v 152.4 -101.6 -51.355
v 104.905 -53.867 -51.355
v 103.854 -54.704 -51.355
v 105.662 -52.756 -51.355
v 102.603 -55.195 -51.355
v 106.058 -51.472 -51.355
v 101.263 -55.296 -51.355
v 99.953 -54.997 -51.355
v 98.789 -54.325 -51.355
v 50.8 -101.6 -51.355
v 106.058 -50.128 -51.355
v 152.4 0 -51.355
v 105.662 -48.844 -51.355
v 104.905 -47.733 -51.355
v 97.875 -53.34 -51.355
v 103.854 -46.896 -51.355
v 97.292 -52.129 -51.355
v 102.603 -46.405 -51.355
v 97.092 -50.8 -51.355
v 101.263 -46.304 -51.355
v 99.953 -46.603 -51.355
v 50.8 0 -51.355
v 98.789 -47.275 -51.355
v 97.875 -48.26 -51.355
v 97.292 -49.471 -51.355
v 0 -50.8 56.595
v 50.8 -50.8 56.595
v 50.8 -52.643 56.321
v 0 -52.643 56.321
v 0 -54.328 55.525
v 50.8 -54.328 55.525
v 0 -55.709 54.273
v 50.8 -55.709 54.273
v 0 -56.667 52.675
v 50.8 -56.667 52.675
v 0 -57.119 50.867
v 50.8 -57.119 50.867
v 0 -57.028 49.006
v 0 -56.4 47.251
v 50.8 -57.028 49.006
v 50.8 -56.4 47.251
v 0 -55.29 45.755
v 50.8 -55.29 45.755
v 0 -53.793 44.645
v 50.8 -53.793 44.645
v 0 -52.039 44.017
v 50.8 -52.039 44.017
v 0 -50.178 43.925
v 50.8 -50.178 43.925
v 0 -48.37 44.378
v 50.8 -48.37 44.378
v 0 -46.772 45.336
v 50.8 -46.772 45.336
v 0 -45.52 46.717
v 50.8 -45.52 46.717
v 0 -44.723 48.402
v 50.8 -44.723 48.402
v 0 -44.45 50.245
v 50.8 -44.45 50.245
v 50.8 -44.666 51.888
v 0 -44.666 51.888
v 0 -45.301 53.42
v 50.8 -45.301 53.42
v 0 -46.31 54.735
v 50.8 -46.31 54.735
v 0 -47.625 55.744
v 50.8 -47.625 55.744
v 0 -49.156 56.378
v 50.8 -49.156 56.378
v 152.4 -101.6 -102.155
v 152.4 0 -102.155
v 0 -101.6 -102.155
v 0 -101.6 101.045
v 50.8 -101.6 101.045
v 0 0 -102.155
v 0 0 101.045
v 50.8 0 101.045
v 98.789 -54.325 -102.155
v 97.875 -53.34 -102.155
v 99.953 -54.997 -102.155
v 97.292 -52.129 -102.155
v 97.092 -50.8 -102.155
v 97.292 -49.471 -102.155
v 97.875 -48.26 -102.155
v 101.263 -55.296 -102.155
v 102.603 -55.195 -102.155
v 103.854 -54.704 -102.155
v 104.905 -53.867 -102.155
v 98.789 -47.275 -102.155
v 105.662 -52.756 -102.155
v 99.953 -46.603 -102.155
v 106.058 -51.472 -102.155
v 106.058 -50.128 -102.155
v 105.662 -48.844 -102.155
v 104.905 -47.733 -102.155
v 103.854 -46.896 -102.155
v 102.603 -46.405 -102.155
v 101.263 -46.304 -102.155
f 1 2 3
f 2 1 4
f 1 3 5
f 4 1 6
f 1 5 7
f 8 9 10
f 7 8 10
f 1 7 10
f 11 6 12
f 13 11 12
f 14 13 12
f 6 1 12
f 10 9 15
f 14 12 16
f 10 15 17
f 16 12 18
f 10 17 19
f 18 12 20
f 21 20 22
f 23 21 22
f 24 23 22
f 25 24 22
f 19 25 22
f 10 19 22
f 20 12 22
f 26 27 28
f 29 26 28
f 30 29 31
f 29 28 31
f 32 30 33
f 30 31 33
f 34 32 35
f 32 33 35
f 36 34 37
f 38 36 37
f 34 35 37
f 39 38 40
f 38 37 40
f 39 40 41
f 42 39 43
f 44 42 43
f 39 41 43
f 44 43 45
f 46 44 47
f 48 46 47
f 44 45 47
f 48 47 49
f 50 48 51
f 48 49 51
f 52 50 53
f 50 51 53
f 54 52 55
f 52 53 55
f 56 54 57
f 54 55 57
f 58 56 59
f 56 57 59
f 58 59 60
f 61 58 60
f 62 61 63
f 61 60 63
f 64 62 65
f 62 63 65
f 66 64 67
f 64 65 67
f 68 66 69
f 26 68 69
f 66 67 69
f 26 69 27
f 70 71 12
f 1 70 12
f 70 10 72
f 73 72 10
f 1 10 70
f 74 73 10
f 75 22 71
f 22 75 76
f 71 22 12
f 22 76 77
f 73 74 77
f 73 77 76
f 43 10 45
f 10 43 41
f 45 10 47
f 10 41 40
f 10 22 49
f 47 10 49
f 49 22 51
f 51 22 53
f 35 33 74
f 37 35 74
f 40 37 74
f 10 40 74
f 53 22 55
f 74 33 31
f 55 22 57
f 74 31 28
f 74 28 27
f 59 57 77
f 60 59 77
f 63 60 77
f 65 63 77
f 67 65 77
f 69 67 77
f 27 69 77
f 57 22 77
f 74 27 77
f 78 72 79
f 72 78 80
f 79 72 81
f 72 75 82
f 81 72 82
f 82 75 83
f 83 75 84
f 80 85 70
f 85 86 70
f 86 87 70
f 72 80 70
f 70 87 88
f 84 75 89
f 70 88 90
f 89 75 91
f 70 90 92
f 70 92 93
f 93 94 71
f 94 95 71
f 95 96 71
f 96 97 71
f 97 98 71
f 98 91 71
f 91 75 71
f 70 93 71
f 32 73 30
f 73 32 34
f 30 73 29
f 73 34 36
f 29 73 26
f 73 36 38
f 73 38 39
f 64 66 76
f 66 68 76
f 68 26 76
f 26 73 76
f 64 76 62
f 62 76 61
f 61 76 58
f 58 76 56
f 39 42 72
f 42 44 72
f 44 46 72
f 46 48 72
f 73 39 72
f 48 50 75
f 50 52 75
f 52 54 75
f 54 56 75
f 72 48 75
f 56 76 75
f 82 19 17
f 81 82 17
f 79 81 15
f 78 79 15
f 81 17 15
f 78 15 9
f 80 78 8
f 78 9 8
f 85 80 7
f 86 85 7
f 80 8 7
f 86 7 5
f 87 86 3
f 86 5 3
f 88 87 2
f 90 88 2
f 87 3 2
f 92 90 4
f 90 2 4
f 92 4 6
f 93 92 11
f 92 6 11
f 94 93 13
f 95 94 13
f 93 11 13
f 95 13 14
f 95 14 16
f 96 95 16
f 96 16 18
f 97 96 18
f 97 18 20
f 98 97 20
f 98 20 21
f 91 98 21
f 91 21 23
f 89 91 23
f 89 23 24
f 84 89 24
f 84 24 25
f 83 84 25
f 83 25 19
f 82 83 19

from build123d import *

# Parameters (mm, degrees)
F1_DEPTH = 101.6
F4_DEPTH = 115.900189
F5_DEPTH = 182.793036


with BuildPart() as f1:
    # F0 (on Front) → F1 (new body)
    with BuildSketch(Plane.XZ):
        Polygon((50.8, 101.044822), (0, 101.044822), (0, -102.155178), (152.4, -102.155178), (152.4, -51.355178), (50.8, -51.355178), align=None)
    extrude(amount=F1_DEPTH)

    # F3 (on face) → F4 (cut)
    with BuildSketch(Plane.XY.offset(-51.355178)):
        with BuildLine():
            ThreePointArc((106.1085, -50.8), (101.6, -46.2915), (97.0915, -50.8))
            ThreePointArc((97.0915, -50.8), (101.6, -55.3085), (106.1085, -50.8))
        make_face()
    extrude(amount=-F4_DEPTH, mode=Mode.SUBTRACT)

    # F2 (on face) → F5 (cut)
    with BuildSketch(Plane.YZ.offset(50.8)):
        with BuildLine():
            ThreePointArc((-44.45, 50.244822), (-46.309872, 54.73495), (-50.8, 56.594822))
            ThreePointArc((-50.8, 56.594822), (-55.290128, 45.754694), (-44.45, 50.244822))
        make_face()
    extrude(amount=-F5_DEPTH, mode=Mode.SUBTRACT)


solid = f1.part
